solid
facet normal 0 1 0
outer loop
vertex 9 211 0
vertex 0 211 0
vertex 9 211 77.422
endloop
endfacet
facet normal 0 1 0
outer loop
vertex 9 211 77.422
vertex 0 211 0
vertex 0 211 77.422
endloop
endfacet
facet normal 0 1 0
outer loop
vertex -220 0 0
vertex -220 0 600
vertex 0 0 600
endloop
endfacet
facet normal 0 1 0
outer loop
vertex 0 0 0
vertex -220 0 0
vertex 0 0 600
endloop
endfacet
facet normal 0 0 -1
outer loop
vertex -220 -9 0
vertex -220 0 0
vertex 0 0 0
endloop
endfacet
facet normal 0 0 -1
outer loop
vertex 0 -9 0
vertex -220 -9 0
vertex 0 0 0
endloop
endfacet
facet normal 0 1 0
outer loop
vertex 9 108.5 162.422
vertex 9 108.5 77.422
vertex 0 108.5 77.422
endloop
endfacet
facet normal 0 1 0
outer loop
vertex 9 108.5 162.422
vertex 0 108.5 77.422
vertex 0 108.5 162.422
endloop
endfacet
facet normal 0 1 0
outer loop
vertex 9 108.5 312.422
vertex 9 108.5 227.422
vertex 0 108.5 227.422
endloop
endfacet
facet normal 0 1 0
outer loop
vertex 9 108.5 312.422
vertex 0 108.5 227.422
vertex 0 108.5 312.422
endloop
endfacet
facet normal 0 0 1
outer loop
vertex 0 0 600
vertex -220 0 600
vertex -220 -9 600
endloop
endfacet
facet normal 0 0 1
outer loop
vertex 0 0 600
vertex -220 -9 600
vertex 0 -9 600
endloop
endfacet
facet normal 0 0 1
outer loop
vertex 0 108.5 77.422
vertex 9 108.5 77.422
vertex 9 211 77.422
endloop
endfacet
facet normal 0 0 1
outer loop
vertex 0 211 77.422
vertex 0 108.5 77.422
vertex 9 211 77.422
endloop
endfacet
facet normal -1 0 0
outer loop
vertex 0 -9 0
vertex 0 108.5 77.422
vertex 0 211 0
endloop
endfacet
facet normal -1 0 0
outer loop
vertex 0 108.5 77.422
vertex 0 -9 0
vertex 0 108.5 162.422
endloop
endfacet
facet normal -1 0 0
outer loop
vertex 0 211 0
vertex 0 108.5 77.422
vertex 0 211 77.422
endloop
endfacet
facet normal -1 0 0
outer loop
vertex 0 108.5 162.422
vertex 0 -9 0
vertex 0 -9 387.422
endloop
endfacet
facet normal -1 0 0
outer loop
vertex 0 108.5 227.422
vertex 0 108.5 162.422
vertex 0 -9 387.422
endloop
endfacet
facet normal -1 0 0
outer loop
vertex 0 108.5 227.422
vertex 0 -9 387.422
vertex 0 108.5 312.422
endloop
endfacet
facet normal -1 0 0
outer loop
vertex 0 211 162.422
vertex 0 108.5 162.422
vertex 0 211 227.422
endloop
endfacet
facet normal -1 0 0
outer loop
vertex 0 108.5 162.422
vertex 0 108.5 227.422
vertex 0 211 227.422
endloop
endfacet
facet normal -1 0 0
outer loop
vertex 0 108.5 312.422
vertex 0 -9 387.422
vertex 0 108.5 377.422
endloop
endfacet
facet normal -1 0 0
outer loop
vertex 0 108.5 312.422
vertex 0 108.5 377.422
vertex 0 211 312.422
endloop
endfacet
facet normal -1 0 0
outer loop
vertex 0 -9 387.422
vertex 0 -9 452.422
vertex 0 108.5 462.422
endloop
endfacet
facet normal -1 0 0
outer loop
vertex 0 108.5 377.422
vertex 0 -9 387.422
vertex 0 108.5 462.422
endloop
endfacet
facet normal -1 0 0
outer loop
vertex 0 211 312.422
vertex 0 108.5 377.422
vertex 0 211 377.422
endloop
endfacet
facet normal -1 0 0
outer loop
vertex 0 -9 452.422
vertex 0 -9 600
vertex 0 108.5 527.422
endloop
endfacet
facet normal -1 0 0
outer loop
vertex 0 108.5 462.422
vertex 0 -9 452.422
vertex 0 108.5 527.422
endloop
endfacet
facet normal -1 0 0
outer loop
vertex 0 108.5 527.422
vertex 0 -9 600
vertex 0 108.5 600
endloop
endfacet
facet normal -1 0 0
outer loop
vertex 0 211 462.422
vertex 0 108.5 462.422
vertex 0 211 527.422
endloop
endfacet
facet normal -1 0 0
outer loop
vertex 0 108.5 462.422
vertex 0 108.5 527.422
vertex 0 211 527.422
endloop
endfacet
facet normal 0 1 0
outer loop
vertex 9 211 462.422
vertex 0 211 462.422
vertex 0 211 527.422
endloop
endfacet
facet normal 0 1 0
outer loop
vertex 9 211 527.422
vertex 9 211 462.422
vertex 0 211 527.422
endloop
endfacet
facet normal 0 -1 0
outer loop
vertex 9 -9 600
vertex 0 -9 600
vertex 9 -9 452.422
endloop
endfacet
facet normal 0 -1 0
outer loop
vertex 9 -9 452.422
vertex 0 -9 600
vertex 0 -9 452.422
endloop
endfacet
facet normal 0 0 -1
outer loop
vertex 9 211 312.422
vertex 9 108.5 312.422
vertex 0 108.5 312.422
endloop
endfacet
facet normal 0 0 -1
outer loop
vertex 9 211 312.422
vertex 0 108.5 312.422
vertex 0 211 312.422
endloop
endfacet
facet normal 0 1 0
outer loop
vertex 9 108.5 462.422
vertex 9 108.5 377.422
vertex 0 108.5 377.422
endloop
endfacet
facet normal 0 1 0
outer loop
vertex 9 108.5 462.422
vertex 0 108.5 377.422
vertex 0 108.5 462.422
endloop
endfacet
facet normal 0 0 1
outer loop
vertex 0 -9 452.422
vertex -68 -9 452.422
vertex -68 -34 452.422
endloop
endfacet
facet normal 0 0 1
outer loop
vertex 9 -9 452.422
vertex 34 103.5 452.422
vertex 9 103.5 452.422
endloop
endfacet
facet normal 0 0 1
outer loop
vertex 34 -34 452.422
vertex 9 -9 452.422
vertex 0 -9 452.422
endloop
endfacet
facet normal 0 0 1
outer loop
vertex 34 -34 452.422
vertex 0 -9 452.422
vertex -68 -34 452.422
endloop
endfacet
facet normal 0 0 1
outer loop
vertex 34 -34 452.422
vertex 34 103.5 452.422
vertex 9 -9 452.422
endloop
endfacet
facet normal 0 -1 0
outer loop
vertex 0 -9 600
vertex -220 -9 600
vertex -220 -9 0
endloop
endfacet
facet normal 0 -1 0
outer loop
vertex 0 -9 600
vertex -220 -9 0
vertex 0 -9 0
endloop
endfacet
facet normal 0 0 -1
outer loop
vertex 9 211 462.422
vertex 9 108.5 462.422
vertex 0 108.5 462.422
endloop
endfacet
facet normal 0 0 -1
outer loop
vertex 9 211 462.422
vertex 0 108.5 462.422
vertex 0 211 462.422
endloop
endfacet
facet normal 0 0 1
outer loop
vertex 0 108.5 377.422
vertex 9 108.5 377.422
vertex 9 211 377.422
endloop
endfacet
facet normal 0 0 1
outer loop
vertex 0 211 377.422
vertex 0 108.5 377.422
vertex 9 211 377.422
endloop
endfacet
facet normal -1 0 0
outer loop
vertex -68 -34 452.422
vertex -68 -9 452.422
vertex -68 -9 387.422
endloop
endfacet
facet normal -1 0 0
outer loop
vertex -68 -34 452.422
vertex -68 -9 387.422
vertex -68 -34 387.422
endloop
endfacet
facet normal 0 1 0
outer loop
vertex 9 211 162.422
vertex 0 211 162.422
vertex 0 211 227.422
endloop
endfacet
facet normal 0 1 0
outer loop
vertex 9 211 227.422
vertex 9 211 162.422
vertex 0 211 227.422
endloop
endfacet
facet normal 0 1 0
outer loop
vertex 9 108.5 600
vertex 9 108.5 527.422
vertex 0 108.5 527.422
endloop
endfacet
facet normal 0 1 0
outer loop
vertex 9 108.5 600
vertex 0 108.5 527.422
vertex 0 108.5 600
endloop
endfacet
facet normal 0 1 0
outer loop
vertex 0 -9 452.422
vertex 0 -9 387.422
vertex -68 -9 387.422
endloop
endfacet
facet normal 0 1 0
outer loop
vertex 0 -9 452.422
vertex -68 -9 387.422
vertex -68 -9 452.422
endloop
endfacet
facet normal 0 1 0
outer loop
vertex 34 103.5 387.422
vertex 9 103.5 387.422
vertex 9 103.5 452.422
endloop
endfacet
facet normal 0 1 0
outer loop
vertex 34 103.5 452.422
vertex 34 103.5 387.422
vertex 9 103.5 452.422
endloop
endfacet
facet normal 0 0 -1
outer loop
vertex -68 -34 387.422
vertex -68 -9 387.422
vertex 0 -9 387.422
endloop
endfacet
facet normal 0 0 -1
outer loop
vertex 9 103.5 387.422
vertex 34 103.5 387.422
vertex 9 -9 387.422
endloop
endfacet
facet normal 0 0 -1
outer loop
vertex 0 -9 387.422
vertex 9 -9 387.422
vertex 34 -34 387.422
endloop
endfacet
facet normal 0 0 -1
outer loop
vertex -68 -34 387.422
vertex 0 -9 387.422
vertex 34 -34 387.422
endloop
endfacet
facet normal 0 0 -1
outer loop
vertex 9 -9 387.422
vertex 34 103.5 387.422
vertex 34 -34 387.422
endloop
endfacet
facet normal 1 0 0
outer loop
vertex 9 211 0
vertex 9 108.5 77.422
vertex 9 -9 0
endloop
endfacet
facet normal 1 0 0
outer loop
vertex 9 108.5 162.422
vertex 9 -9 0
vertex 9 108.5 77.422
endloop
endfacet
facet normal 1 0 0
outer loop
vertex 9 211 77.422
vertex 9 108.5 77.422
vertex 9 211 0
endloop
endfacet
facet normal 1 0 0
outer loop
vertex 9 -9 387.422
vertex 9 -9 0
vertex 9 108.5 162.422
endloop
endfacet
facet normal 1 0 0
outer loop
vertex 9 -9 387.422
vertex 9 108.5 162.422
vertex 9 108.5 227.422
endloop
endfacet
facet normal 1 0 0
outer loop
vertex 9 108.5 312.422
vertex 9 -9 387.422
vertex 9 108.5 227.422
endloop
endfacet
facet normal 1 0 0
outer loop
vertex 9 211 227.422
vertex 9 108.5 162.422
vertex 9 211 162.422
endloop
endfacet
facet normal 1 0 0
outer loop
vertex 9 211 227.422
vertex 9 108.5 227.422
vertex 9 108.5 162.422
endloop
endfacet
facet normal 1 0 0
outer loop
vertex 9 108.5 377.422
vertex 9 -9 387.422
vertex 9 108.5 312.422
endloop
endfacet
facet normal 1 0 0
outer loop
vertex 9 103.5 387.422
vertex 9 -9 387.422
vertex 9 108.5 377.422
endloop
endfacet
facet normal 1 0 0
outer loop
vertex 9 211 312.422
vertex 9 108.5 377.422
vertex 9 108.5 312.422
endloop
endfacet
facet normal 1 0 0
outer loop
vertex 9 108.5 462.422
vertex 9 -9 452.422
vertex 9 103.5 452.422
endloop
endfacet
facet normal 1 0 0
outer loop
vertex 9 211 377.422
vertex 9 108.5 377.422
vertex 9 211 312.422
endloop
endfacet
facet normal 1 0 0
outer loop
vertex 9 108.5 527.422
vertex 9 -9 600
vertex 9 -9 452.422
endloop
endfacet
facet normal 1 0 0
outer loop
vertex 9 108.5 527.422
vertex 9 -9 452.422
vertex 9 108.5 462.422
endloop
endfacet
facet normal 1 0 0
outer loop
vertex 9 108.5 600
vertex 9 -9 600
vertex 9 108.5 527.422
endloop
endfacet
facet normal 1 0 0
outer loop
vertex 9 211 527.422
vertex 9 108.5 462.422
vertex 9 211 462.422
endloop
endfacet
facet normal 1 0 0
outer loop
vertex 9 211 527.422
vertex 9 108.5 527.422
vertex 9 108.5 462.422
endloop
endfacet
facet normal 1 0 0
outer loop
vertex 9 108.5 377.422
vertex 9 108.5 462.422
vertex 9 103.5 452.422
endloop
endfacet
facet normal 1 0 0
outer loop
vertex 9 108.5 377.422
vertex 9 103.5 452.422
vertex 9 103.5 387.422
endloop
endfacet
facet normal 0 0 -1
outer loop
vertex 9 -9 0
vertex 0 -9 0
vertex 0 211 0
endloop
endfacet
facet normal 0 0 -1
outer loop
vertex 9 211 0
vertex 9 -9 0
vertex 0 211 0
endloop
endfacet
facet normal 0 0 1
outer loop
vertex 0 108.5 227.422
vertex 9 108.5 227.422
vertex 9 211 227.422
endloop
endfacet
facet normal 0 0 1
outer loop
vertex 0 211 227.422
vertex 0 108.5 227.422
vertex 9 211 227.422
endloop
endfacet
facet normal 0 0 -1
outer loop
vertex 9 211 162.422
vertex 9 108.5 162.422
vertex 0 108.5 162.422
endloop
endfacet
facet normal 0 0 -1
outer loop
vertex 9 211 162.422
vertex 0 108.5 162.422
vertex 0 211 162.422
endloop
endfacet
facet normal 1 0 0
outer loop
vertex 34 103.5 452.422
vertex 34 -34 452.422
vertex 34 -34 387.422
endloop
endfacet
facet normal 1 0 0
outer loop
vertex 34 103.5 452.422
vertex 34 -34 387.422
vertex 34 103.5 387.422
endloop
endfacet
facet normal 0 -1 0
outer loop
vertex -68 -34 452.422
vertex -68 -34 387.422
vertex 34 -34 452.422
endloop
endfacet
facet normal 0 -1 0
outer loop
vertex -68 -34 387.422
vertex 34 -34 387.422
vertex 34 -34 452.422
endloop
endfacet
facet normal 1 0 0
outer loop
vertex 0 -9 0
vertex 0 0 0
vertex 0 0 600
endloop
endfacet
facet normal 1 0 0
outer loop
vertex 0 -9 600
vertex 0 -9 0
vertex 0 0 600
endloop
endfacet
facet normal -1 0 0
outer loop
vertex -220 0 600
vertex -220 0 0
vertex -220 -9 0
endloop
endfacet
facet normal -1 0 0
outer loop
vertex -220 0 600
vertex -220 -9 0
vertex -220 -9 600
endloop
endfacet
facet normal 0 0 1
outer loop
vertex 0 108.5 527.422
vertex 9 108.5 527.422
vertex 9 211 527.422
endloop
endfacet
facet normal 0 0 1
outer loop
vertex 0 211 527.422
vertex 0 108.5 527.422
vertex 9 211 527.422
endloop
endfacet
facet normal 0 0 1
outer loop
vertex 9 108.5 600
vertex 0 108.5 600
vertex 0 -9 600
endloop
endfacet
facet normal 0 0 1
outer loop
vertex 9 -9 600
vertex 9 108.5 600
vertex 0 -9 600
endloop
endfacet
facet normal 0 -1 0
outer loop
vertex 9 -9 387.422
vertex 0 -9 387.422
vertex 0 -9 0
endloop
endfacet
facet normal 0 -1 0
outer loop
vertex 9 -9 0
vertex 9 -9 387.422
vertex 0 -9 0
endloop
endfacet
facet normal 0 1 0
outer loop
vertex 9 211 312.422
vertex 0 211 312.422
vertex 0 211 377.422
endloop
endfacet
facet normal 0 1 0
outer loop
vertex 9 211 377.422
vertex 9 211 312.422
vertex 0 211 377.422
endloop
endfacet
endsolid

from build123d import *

# Parameters (mm, degrees)
F0_W     = 220
F0_H     = 600
F1_DEPTH = 9
F3_DEPTH = 9
F4_W     = 102.5
F4_H     = 72.5783139467
F4_H_2   = 85
F5_DEPTH = 25
F6_W     = 112.5
F6_H     = 65
F6_W_2   = 25
F7_DEPTH = 25
F8_W     = 25
F8_H     = 65
F9_DEPTH = 77


with BuildPart() as f1:
    # F0 (on Front) → F1 (new body)
    with BuildSketch(Plane.XZ):
        with Locations((-110, 300)):
            Rectangle(F0_W, F0_H)
    extrude(amount=F1_DEPTH)


with BuildPart() as f3:
    # F2 (on Right) → F3 (new body)
    with BuildSketch(Plane.YZ):
        Polygon((-9, 0), (0, 0), (211, 0), (211, 600), (-9, 600), align=None)
    extrude(amount=F3_DEPTH)

    # F4 (on face) → F5 (cut)
    with BuildSketch(Plane.YZ.offset(9)):
        with Locations((159.75, 563.7108430266)):
            Rectangle(F4_W, F4_H)
        with Locations((159.75, 419.9216860533)):
            Rectangle(F4_W, F4_H_2)
        with Locations((159.75, 119.9216860533)):
            Rectangle(F4_W, F4_H_2)
        with Locations((159.75, 269.9216860533)):
            Rectangle(F4_W, F4_H_2)
    extrude(amount=-F5_DEPTH, mode=Mode.SUBTRACT)

    # F6 (on face) → F7 (join)
    with BuildSketch(Plane.YZ.offset(9)):
        with Locations((47.25, 419.9216860533)):
            Rectangle(F6_W, F6_H)
        with Locations((-21.5, 419.9216860533)):
            Rectangle(F6_W_2, F6_H)
    extrude(amount=F7_DEPTH)

    # F8 (on face) → F9 (join)
    with BuildSketch(Plane(origin=(9, 0, 0), x_dir=(0, -1, 0), z_dir=(-1, 0, 0))):
        with Locations((21.5, 419.9216860533)):
            Rectangle(F8_W, F8_H)
    extrude(amount=F9_DEPTH)


solid = Compound([f1.part, f3.part])
